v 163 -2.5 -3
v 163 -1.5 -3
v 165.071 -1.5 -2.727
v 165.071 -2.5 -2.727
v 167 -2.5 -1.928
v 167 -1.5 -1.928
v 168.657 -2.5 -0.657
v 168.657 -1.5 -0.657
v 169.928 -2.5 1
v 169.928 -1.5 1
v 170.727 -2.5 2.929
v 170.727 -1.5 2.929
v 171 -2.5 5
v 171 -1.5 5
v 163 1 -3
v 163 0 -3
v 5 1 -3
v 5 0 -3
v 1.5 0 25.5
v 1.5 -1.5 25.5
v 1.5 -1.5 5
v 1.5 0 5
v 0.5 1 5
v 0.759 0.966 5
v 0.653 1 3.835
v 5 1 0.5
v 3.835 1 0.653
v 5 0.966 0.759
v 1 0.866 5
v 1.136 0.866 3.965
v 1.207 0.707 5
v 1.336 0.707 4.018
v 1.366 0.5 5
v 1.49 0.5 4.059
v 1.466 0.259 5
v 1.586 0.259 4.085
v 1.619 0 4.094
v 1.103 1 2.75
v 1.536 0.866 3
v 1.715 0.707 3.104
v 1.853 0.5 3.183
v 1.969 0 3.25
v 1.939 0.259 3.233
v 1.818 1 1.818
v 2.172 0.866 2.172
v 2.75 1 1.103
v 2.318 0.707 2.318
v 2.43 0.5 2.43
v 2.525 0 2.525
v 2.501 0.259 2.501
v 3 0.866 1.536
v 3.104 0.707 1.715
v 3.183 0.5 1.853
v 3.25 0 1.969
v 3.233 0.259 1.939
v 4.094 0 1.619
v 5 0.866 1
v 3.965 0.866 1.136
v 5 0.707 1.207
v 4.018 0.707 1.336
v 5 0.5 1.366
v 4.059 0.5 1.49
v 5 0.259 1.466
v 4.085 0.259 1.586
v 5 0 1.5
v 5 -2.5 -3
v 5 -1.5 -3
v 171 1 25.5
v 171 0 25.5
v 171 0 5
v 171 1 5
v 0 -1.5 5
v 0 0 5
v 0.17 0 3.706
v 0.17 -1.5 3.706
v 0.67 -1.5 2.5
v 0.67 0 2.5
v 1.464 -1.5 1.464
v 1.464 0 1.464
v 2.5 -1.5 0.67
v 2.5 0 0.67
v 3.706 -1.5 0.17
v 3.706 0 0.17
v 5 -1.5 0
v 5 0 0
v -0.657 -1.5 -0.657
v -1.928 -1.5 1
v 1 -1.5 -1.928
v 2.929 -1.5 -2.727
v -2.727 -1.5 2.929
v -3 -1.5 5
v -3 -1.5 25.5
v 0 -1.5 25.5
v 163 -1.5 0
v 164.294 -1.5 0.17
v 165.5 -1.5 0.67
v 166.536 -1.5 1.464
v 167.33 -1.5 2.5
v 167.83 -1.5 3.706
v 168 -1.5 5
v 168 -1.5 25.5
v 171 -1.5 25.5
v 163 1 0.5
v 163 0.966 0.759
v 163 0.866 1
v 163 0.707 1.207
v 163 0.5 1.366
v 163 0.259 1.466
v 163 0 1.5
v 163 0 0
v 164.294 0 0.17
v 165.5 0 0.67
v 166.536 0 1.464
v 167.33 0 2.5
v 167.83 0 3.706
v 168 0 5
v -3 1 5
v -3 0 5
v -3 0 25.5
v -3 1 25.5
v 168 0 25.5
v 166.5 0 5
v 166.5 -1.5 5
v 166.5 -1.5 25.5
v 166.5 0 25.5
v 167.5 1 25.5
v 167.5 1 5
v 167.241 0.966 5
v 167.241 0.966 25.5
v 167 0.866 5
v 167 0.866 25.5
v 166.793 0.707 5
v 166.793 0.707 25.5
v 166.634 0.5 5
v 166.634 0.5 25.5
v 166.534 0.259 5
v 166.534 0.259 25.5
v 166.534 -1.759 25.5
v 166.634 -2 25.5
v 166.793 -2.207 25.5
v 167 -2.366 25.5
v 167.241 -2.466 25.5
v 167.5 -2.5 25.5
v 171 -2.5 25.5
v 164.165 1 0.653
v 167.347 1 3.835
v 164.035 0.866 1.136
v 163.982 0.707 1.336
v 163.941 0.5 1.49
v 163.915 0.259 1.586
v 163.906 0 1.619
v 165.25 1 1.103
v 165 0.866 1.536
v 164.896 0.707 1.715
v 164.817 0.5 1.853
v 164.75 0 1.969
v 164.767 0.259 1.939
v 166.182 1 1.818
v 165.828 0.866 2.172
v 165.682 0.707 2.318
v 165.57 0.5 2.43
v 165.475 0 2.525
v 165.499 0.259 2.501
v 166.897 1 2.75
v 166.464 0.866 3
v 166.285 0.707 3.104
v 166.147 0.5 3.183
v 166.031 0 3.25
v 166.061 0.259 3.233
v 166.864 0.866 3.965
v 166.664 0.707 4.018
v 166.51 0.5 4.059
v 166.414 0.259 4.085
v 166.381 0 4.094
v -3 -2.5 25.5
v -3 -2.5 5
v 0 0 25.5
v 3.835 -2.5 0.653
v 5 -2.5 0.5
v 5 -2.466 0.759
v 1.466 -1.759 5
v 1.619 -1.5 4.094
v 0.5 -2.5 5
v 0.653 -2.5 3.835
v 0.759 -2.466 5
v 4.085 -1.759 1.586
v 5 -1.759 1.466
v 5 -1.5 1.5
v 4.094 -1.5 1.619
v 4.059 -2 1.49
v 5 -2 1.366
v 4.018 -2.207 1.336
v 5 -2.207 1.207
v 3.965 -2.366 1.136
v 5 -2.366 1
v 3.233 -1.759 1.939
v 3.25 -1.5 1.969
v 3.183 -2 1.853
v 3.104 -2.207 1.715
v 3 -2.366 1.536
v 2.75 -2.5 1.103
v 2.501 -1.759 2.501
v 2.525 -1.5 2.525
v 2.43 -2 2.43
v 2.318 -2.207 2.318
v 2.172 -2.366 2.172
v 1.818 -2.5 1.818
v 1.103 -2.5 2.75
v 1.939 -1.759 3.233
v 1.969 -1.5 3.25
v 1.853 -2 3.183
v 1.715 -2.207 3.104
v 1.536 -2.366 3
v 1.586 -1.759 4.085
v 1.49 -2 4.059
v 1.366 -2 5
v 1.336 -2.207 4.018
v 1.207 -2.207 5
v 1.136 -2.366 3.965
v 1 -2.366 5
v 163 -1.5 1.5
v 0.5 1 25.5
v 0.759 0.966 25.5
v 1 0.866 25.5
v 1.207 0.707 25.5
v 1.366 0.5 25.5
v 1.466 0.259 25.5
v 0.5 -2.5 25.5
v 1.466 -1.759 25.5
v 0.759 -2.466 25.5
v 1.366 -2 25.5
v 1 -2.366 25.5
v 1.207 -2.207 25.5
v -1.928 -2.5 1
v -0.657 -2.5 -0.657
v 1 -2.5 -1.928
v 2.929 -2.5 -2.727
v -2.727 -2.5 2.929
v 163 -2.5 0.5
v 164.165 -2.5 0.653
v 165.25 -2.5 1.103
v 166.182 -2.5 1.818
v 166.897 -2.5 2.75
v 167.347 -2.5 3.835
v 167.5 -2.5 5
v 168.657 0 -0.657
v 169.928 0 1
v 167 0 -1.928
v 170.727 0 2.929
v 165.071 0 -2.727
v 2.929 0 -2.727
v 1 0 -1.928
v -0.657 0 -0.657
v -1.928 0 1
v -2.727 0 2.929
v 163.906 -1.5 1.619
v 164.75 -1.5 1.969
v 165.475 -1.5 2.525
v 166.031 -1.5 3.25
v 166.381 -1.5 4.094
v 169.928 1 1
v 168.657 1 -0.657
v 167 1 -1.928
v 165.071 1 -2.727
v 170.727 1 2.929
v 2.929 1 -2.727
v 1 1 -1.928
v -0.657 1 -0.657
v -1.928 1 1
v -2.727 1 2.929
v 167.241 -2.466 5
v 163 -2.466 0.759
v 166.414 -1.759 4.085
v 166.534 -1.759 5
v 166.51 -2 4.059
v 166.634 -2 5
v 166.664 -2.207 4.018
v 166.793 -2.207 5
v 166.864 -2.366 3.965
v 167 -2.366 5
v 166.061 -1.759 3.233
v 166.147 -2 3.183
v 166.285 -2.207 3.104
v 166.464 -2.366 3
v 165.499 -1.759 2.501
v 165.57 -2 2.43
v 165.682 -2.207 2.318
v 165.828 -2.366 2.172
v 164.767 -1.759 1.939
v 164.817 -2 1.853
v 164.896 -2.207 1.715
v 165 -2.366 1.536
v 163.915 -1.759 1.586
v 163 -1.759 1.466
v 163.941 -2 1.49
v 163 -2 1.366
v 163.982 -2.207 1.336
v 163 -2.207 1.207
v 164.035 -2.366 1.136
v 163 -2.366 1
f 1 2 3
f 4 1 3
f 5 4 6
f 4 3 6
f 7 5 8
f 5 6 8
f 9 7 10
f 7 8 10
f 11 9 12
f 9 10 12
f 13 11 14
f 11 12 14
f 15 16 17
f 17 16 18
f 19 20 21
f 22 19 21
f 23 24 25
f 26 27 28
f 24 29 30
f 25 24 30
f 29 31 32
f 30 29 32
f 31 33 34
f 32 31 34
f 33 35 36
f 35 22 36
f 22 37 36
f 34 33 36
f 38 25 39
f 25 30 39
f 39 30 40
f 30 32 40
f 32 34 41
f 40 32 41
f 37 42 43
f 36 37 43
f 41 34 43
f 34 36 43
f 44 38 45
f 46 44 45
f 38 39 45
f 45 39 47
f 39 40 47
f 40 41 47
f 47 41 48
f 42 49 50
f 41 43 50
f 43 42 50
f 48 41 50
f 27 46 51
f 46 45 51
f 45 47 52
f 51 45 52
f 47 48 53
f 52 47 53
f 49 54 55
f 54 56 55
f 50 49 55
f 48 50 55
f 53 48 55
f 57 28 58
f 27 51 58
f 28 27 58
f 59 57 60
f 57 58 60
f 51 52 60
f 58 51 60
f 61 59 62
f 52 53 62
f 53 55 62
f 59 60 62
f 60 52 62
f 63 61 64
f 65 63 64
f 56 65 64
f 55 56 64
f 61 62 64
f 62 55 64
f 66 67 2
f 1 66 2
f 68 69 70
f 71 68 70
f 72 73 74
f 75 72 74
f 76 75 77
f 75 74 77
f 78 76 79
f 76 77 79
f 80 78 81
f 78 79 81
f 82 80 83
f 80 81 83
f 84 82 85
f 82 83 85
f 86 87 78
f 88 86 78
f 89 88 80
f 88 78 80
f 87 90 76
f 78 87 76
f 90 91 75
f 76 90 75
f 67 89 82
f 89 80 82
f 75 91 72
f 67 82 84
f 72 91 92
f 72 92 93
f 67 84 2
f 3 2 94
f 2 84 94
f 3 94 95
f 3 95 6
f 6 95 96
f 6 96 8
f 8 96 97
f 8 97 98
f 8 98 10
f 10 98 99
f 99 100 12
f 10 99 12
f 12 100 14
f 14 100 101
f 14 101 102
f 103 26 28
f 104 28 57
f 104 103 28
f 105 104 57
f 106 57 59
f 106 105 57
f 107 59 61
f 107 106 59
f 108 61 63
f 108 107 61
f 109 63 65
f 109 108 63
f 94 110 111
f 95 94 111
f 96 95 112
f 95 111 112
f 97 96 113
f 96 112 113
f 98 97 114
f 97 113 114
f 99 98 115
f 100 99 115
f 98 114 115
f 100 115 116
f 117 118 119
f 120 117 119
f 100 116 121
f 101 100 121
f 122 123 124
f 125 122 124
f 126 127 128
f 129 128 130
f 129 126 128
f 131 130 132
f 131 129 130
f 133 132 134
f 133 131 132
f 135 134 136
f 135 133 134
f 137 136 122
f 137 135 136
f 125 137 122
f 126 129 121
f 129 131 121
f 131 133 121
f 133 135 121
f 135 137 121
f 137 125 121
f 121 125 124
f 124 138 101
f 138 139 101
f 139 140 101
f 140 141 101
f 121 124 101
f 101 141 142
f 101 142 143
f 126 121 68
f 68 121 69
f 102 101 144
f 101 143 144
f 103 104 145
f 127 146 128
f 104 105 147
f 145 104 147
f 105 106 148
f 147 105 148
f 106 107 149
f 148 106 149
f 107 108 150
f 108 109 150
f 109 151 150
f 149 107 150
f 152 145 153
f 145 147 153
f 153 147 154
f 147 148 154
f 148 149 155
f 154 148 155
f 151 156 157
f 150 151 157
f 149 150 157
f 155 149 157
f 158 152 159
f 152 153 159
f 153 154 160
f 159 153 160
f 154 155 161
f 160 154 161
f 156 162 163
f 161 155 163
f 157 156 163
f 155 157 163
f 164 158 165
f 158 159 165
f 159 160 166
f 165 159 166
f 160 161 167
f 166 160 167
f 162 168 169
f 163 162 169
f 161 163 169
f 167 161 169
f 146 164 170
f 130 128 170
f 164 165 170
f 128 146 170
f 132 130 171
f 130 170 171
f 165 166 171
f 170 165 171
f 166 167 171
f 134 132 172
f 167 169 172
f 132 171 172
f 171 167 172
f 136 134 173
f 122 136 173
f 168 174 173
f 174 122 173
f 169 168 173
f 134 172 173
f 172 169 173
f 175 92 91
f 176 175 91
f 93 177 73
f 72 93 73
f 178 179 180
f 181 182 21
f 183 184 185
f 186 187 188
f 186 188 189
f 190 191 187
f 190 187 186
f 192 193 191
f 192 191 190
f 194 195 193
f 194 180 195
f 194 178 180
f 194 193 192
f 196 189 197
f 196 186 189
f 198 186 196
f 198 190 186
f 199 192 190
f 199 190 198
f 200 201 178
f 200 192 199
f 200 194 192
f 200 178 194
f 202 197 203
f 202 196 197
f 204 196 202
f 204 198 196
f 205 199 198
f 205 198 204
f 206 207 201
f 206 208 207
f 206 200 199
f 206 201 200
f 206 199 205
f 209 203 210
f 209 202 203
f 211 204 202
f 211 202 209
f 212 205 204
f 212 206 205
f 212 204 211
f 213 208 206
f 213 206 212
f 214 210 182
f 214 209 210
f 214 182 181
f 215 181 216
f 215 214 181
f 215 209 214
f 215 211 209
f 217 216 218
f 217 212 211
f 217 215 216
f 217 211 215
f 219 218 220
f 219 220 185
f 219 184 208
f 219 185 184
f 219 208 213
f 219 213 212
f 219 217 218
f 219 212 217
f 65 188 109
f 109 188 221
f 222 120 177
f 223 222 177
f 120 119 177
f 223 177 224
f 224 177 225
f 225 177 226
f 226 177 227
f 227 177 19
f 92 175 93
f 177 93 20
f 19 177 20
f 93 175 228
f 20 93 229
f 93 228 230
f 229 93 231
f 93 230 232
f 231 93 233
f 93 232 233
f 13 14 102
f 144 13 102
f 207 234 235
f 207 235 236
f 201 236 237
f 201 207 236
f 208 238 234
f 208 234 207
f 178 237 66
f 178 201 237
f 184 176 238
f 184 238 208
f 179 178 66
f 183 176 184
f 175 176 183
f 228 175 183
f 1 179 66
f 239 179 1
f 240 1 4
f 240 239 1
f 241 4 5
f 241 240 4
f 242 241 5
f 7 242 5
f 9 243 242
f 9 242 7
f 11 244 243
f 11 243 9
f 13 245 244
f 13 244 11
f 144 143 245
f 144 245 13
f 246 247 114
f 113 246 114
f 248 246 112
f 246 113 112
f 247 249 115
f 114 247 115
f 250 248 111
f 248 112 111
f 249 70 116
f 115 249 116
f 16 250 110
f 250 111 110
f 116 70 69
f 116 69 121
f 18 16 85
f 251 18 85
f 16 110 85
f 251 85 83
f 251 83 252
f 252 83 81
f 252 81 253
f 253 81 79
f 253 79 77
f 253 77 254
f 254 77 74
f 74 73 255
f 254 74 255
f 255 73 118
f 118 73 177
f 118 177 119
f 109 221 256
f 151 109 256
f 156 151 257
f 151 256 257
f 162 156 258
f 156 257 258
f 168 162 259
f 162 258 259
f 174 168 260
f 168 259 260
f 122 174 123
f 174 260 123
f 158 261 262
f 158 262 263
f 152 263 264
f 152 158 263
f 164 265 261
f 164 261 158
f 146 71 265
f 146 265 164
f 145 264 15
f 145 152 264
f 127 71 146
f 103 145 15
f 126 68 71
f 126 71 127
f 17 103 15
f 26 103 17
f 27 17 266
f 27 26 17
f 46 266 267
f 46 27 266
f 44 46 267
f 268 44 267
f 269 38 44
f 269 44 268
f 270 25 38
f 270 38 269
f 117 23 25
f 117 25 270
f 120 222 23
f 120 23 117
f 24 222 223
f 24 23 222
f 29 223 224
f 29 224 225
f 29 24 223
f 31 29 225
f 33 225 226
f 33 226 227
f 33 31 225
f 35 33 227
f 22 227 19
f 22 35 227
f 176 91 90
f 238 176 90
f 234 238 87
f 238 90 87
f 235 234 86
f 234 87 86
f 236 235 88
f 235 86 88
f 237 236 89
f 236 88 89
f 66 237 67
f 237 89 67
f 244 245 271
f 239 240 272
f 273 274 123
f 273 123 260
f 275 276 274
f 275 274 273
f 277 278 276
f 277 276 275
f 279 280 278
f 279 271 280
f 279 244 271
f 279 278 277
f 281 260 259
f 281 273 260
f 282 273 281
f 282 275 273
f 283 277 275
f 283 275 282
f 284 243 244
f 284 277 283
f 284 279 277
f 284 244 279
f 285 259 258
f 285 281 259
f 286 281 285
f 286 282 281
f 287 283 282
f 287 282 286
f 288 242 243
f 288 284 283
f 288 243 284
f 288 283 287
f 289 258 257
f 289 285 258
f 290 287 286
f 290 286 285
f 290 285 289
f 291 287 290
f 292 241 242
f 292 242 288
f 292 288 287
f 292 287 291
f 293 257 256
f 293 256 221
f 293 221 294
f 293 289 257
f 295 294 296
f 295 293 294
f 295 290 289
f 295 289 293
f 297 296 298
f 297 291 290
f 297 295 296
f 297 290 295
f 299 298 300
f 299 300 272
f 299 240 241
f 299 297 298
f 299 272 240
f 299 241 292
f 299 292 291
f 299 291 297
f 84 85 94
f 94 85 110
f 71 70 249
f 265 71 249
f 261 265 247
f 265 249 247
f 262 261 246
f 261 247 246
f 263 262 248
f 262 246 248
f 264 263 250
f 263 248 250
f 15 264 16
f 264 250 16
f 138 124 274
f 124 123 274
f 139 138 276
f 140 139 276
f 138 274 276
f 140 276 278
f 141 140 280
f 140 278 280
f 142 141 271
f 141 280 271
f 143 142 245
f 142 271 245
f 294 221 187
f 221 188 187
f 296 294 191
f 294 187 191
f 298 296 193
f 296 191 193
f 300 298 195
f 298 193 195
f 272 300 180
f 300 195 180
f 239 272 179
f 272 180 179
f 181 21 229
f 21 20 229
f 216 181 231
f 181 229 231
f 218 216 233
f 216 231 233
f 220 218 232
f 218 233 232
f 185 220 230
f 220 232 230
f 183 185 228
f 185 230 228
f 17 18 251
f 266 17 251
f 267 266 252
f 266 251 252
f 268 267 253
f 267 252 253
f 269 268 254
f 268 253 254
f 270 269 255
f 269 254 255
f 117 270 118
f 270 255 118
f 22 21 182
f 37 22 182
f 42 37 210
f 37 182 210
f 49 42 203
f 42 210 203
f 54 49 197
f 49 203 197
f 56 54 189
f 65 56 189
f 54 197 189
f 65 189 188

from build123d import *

# Parameters (mm, degrees)
F1_DEPTH = 1.5
F3_DEPTH = 1
F5_DEPTH = 1
F6_R     = 0.99999


# Not quite as in the source:
# - a fillet or chamfer is up to 0.001 mm smaller than in the source, because OpenCascade refuses the exact size
# - ends of sketch curves that miss each other by under 0.0002 mm in the source are joined


with BuildPart() as f1:
    # F0 (on Front) → F1 (new body)
    with BuildSketch(Plane.XZ):
        with BuildLine():
            Line((1.5, 25.5), (0, 25.5))
            Line((0, 25.5), (0, 5))
            ThreePointArc((0, 5), (1.4644660941, 1.4644660941), (5, 0))
            Line((5, 0), (163, 0))
            ThreePointArc((163, 0), (166.5355339059, 1.4644660941), (168, 5))
            Line((168, 5), (168, 25.5))
            Line((168, 25.5), (166.5, 25.5))
            Line((166.5, 25.5), (166.5, 5))
            ThreePointArc((166.5, 5), (165.4748737342, 2.5251262658), (163, 1.5))
            Line((163, 1.5), (5, 1.5))
            ThreePointArc((5, 1.5), (2.5251262658, 2.5251262658), (1.5, 5))
            Line((1.5, 5), (1.5, 25.5))
        make_face()
    extrude(amount=F1_DEPTH)

    # F2 (on face) → F3 (join)
    with BuildSketch(Plane.XZ.offset(1.5)):
        with BuildLine():
            Line((1.5, 5), (1.5, 25.5))
            Line((1.5, 25.5), (-3, 25.5))
            Line((-3, 25.5), (-3, 4.9999991791))
            ThreePointArc((-3, 4.9999991791), (-0.6568544899, -0.6568544899), (4.9999991791, -3))
            Line((4.9999991791, -3), (163, -3))
            ThreePointArc((163, -3), (168.6568542495, -0.6568542495), (171, 5))
            Line((171, 5), (171, 25.5))
            Line((171, 25.5), (166.5, 25.5))
            Line((166.5, 25.5), (166.5, 5))
            ThreePointArc((166.5, 5), (165.4748737342, 2.5251262658), (163, 1.5))
            Line((163, 1.5), (5, 1.5))
            ThreePointArc((5, 1.5), (2.5251257352, 2.5251263156), (1.5, 5))
        make_face()
    extrude(amount=F3_DEPTH)

    # F4 (on face) → F5 (join)
    with BuildSketch(Plane(origin=(0, 0, 0), x_dir=(-1, 0, 0), z_dir=(0, 1, 0))):
        with BuildLine():
            Line((-166.5, 5), (-166.5, 25.5))
            Line((-166.5, 25.5), (-171, 25.5))
            Line((-171, 25.5), (-171, 5))
            ThreePointArc((-171, 5), (-168.6568542495, -0.6568542495), (-163, -3))
            Line((-163, -3), (-5, -3))
            ThreePointArc((-5, -3), (0.6568542495, -0.6568542495), (3, 5))
            Line((3, 5), (3, 25.5))
            Line((3, 25.5), (-1.5, 25.5))
            Line((-1.5, 25.5), (-1.5, 5))
            ThreePointArc((-1.5, 5), (-2.5251262658, 2.5251262658), (-5, 1.5))
            Line((-5, 1.5), (-163, 1.5))
            ThreePointArc((-163, 1.5), (-165.4748737342, 2.5251262658), (-166.5, 5))
        make_face()
    extrude(amount=F5_DEPTH)

    # F6 (radius 1 in the source; OpenCascade refuses exactly that, so slightly less here)
    f6_edges = [f1.edges().sort_by_distance(p)[0] for p in [
        (165.474874, 1, 2.525126),
        (166.5, -2.5, 15.25),
    ]]
    fillet(f6_edges, radius=F6_R)


solid = f1.part
